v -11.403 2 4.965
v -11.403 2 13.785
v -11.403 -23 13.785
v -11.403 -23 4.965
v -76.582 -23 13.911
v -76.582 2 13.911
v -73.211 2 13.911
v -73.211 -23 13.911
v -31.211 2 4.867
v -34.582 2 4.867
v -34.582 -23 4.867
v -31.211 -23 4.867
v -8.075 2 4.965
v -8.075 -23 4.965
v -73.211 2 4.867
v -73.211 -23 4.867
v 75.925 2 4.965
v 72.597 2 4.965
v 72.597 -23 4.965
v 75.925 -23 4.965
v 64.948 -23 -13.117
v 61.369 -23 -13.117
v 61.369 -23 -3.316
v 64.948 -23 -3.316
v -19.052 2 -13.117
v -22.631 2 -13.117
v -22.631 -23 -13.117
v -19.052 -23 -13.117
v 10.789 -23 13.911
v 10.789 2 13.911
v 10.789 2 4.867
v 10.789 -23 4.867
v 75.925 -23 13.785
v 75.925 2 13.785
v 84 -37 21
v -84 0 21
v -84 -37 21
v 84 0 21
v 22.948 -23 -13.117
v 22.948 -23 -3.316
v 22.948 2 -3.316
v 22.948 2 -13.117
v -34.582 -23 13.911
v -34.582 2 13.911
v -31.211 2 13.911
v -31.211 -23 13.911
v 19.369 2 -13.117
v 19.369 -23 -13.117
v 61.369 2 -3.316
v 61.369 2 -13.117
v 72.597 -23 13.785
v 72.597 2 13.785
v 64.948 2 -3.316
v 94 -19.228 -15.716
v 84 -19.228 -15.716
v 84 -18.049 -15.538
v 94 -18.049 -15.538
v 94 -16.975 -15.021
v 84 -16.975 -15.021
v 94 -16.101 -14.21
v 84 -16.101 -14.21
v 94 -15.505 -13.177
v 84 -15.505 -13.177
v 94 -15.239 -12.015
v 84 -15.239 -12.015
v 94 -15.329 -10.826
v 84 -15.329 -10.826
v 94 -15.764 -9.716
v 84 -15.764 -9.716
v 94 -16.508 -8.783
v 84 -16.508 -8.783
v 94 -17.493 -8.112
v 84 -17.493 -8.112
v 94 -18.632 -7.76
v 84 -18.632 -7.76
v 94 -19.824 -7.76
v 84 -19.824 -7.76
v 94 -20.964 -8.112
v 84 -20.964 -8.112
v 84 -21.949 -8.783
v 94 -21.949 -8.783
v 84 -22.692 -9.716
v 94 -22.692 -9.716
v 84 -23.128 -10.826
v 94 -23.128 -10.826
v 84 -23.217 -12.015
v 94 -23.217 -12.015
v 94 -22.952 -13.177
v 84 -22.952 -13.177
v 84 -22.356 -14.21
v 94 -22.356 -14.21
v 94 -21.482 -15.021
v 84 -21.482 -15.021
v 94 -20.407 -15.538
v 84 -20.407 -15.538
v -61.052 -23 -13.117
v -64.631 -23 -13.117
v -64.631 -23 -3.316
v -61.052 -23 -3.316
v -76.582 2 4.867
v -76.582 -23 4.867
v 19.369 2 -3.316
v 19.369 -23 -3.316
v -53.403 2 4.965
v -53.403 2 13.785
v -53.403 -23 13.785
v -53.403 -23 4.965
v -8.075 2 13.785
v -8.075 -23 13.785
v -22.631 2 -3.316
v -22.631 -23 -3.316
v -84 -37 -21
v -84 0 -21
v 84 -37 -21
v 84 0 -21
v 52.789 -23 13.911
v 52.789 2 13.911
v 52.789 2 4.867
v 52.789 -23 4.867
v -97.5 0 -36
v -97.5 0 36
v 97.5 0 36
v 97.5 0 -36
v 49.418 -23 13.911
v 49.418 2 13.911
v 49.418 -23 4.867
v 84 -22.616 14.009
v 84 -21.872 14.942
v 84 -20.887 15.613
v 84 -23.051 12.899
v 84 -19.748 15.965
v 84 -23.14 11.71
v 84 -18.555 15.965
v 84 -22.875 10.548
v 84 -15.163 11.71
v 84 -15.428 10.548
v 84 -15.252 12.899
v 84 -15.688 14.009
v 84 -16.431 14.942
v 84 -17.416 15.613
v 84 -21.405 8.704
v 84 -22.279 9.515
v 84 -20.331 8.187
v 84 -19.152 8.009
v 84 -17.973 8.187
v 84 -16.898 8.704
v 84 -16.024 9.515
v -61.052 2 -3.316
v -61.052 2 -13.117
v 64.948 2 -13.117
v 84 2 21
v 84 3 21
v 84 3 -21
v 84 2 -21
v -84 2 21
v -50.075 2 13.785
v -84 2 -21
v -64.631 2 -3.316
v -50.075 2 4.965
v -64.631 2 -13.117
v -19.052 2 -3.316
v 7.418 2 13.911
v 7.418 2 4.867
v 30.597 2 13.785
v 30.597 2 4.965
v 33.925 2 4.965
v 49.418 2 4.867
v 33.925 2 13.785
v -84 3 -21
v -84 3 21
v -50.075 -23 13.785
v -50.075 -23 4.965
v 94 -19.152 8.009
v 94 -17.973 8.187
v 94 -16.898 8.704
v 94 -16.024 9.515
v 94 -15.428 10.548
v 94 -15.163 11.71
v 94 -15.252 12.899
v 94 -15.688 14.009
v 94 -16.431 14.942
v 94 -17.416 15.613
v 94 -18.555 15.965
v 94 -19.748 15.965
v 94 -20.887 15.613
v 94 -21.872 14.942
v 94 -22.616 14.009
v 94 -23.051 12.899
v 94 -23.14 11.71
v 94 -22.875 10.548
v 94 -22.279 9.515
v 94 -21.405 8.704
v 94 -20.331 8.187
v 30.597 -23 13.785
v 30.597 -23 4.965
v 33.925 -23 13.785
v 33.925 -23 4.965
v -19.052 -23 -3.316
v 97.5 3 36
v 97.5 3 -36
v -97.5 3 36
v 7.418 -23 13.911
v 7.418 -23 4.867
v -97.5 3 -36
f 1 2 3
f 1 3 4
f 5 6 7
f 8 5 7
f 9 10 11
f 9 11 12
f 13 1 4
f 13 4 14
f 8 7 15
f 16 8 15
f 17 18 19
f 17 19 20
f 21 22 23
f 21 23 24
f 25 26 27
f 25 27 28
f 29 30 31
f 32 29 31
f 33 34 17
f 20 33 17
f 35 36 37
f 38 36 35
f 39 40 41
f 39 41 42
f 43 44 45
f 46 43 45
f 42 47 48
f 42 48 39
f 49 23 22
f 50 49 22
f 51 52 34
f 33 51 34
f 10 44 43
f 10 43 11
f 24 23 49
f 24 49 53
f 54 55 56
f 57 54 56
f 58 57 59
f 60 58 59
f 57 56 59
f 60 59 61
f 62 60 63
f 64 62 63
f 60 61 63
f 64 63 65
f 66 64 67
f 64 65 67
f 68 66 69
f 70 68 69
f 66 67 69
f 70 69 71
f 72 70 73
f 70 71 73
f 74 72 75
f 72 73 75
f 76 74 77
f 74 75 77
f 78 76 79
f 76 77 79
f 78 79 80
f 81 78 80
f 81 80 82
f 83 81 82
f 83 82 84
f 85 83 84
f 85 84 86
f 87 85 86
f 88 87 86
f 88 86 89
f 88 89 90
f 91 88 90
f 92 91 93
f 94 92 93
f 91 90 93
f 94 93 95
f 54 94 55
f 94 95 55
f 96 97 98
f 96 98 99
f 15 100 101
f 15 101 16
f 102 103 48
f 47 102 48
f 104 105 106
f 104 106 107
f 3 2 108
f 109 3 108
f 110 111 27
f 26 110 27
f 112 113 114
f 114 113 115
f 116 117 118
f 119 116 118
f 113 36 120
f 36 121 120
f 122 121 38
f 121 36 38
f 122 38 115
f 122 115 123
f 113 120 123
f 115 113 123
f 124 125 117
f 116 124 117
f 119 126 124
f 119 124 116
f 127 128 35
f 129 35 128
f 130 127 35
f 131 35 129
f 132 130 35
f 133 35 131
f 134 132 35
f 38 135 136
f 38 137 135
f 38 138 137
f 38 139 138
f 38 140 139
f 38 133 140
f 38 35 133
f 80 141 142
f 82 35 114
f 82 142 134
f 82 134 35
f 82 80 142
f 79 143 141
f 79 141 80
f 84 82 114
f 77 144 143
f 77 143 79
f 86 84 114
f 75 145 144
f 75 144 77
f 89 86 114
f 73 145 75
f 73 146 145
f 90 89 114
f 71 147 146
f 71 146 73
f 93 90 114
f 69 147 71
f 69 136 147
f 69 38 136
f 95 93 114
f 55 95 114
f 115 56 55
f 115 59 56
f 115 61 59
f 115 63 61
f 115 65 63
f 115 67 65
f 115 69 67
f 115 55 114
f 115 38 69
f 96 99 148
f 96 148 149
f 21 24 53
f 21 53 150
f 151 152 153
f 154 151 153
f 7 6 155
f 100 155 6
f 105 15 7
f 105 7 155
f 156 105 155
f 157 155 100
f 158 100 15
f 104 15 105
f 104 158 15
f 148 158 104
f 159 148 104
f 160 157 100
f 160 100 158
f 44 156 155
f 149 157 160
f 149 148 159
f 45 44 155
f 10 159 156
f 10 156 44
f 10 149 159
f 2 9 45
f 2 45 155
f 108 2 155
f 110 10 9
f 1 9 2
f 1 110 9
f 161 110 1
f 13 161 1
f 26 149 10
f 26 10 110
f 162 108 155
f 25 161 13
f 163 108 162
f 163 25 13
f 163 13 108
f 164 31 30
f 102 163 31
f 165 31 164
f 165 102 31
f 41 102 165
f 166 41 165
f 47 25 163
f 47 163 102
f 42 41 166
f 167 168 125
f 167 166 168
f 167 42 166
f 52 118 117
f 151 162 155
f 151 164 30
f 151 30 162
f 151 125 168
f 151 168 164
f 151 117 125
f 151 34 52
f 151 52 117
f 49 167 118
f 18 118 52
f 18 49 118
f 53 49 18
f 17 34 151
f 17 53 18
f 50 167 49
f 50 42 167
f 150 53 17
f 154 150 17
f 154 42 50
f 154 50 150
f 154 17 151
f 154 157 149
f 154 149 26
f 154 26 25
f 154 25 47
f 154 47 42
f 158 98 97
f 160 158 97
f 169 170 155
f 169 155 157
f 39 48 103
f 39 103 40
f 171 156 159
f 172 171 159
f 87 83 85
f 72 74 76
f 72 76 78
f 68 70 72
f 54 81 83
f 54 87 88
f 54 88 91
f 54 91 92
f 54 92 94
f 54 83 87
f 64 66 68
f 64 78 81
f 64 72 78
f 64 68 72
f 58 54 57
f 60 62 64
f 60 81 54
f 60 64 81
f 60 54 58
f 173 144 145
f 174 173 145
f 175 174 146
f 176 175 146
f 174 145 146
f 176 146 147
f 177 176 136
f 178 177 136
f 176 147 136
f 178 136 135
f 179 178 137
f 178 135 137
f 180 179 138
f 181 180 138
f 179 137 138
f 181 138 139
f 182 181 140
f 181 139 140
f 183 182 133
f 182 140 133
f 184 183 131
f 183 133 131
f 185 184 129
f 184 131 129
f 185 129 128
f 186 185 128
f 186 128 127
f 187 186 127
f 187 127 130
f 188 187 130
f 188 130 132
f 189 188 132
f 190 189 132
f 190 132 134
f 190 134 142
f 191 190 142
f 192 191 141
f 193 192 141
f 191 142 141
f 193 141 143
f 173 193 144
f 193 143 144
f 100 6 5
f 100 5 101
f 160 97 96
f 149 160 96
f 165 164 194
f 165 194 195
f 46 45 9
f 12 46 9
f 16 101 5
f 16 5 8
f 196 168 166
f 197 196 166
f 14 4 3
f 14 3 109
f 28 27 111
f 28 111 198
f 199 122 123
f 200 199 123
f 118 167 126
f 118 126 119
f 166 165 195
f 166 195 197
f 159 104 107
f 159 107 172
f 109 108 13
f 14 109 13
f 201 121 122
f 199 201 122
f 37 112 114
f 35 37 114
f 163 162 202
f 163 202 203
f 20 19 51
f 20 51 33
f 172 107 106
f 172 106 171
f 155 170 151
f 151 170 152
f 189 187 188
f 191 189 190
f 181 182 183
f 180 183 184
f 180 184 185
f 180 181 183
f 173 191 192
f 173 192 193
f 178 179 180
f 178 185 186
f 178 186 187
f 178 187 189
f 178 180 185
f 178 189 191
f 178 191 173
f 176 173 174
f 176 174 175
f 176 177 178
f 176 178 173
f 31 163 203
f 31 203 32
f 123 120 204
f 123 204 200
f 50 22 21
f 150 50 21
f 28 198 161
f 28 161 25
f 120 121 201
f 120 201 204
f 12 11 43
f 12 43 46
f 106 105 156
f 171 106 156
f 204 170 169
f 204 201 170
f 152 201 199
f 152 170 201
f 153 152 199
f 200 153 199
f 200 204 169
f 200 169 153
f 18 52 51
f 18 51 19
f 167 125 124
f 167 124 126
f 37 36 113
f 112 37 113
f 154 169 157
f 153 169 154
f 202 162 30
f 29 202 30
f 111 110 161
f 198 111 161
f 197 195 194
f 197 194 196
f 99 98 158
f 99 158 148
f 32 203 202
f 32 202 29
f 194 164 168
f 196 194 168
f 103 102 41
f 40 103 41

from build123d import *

# Parameters (mm, degrees)
SKETCH_1_W          = 195
SKETCH_1_H          = 72
EXTRUDE_1_DEPTH     = 3
SKETCH_2_W          = 168
SKETCH_2_H          = 42
EXTRUDE_2_DEPTH     = 40
SKETCH_2_2_W        = 168
SKETCH_2_2_H        = 42
CUT_EXTRUDE_1_DEPTH = 1
SKETCH_3_R          = 4
EXTRUDE_3_DEPTH     = 10
SKETCH_4_R          = 4
EXTRUDE_4_DEPTH     = 10
SKETCH_7_W          = 3.370643822
SKETCH_7_H          = 9.043190742
CUT_EXTRUDE_2_DEPTH = 25
SKETCH_6_W          = 3.579680374
SKETCH_6_H          = 9.801505786
CUT_EXTRUDE_3_DEPTH = 25
SKETCH_8_W          = 3.328212
SKETCH_8_H          = 8.8197618
CUT_EXTRUDE_4_DEPTH = 25


with BuildPart() as part:
    # 草图1 → 凸台-拉伸1 (new body)
    with BuildSketch(Plane(origin=(0, 0, 0), x_dir=(1, 0, 0), z_dir=(0, 1, 0))):
        Rectangle(SKETCH_1_W, SKETCH_1_H)
    extrude(amount=EXTRUDE_1_DEPTH)

    # 草图2 → 凸台-拉伸2 (add)
    with BuildSketch(Plane(origin=(0, 3, 0), x_dir=(1, 0, 0), z_dir=(0, 1, 0))):
        Rectangle(SKETCH_2_W, SKETCH_2_H)
    extrude(amount=-EXTRUDE_2_DEPTH)

    # 草图2<2> → 切除-拉伸1 (cut)
    with BuildSketch(Plane(origin=(0, 3, 0), x_dir=(1, 0, 0), z_dir=(0, 1, 0))):
        Rectangle(SKETCH_2_2_W, SKETCH_2_2_H)
    extrude(amount=-CUT_EXTRUDE_1_DEPTH, mode=Mode.SUBTRACT)

    # 草图3 → 凸台-拉伸3 (add)
    with BuildSketch(Plane(origin=(84, 0, 0), x_dir=(0, 0, -1), z_dir=(1, 0, 0))):
        with Locations((-12.009379944, -19.151607151)):
            Circle(SKETCH_3_R)
    extrude(amount=EXTRUDE_3_DEPTH)

    # 草图4 → 凸台-拉伸4 (add)
    with BuildSketch(Plane(origin=(84, 0, 0), x_dir=(0, 0, -1), z_dir=(1, 0, 0))):
        with Locations((11.71568974, -19.228280966)):
            Circle(SKETCH_4_R)
    extrude(amount=EXTRUDE_4_DEPTH)

    # 草图7 → 切除-拉伸2 (cut)
    with BuildSketch(Plane(origin=(0, 2, 0), x_dir=(1, 0, 0), z_dir=(0, 1, 0))):
        with Locations((-32.896346176, -9.388907812)):
            Rectangle(SKETCH_7_W, SKETCH_7_H)
        with Locations((-74.896346176, -9.388907812)):
            Rectangle(SKETCH_7_W, SKETCH_7_H)
        with Locations((9.103653824, -9.388907812)):
            Rectangle(SKETCH_7_W, SKETCH_7_H)
        with Locations((51.103653824, -9.388907812)):
            Rectangle(SKETCH_7_W, SKETCH_7_H)
    extrude(amount=-CUT_EXTRUDE_2_DEPTH, mode=Mode.SUBTRACT)

    # 草图6 → 切除-拉伸3 (cut)
    with BuildSketch(Plane(origin=(0, 2, 0), x_dir=(1, 0, 0), z_dir=(0, 1, 0))):
        with Locations((-20.841650073, 8.216489042)):
            Rectangle(SKETCH_6_W, SKETCH_6_H)
        with Locations((-62.841650073, 8.216489042)):
            Rectangle(SKETCH_6_W, SKETCH_6_H)
        with Locations((21.158349927, 8.216489042)):
            Rectangle(SKETCH_6_W, SKETCH_6_H)
        with Locations((63.158349927, 8.216489042)):
            Rectangle(SKETCH_6_W, SKETCH_6_H)
    extrude(amount=-CUT_EXTRUDE_3_DEPTH, mode=Mode.SUBTRACT)

    # 草图8 → 切除-拉伸4 (cut)
    with BuildSketch(Plane(origin=(0, 2, 0), x_dir=(1, 0, 0), z_dir=(0, 1, 0))):
        with Locations((-9.739053762, -9.375255868)):
            Rectangle(SKETCH_8_W, SKETCH_8_H)
        with Locations((-51.739053762, -9.375255868)):
            Rectangle(SKETCH_8_W, SKETCH_8_H)
        with Locations((32.260946238, -9.375255868)):
            Rectangle(SKETCH_8_W, SKETCH_8_H)
        with Locations((74.260946238, -9.375255868)):
            Rectangle(SKETCH_8_W, SKETCH_8_H)
    extrude(amount=-CUT_EXTRUDE_4_DEPTH, mode=Mode.SUBTRACT)


solid = part.part
